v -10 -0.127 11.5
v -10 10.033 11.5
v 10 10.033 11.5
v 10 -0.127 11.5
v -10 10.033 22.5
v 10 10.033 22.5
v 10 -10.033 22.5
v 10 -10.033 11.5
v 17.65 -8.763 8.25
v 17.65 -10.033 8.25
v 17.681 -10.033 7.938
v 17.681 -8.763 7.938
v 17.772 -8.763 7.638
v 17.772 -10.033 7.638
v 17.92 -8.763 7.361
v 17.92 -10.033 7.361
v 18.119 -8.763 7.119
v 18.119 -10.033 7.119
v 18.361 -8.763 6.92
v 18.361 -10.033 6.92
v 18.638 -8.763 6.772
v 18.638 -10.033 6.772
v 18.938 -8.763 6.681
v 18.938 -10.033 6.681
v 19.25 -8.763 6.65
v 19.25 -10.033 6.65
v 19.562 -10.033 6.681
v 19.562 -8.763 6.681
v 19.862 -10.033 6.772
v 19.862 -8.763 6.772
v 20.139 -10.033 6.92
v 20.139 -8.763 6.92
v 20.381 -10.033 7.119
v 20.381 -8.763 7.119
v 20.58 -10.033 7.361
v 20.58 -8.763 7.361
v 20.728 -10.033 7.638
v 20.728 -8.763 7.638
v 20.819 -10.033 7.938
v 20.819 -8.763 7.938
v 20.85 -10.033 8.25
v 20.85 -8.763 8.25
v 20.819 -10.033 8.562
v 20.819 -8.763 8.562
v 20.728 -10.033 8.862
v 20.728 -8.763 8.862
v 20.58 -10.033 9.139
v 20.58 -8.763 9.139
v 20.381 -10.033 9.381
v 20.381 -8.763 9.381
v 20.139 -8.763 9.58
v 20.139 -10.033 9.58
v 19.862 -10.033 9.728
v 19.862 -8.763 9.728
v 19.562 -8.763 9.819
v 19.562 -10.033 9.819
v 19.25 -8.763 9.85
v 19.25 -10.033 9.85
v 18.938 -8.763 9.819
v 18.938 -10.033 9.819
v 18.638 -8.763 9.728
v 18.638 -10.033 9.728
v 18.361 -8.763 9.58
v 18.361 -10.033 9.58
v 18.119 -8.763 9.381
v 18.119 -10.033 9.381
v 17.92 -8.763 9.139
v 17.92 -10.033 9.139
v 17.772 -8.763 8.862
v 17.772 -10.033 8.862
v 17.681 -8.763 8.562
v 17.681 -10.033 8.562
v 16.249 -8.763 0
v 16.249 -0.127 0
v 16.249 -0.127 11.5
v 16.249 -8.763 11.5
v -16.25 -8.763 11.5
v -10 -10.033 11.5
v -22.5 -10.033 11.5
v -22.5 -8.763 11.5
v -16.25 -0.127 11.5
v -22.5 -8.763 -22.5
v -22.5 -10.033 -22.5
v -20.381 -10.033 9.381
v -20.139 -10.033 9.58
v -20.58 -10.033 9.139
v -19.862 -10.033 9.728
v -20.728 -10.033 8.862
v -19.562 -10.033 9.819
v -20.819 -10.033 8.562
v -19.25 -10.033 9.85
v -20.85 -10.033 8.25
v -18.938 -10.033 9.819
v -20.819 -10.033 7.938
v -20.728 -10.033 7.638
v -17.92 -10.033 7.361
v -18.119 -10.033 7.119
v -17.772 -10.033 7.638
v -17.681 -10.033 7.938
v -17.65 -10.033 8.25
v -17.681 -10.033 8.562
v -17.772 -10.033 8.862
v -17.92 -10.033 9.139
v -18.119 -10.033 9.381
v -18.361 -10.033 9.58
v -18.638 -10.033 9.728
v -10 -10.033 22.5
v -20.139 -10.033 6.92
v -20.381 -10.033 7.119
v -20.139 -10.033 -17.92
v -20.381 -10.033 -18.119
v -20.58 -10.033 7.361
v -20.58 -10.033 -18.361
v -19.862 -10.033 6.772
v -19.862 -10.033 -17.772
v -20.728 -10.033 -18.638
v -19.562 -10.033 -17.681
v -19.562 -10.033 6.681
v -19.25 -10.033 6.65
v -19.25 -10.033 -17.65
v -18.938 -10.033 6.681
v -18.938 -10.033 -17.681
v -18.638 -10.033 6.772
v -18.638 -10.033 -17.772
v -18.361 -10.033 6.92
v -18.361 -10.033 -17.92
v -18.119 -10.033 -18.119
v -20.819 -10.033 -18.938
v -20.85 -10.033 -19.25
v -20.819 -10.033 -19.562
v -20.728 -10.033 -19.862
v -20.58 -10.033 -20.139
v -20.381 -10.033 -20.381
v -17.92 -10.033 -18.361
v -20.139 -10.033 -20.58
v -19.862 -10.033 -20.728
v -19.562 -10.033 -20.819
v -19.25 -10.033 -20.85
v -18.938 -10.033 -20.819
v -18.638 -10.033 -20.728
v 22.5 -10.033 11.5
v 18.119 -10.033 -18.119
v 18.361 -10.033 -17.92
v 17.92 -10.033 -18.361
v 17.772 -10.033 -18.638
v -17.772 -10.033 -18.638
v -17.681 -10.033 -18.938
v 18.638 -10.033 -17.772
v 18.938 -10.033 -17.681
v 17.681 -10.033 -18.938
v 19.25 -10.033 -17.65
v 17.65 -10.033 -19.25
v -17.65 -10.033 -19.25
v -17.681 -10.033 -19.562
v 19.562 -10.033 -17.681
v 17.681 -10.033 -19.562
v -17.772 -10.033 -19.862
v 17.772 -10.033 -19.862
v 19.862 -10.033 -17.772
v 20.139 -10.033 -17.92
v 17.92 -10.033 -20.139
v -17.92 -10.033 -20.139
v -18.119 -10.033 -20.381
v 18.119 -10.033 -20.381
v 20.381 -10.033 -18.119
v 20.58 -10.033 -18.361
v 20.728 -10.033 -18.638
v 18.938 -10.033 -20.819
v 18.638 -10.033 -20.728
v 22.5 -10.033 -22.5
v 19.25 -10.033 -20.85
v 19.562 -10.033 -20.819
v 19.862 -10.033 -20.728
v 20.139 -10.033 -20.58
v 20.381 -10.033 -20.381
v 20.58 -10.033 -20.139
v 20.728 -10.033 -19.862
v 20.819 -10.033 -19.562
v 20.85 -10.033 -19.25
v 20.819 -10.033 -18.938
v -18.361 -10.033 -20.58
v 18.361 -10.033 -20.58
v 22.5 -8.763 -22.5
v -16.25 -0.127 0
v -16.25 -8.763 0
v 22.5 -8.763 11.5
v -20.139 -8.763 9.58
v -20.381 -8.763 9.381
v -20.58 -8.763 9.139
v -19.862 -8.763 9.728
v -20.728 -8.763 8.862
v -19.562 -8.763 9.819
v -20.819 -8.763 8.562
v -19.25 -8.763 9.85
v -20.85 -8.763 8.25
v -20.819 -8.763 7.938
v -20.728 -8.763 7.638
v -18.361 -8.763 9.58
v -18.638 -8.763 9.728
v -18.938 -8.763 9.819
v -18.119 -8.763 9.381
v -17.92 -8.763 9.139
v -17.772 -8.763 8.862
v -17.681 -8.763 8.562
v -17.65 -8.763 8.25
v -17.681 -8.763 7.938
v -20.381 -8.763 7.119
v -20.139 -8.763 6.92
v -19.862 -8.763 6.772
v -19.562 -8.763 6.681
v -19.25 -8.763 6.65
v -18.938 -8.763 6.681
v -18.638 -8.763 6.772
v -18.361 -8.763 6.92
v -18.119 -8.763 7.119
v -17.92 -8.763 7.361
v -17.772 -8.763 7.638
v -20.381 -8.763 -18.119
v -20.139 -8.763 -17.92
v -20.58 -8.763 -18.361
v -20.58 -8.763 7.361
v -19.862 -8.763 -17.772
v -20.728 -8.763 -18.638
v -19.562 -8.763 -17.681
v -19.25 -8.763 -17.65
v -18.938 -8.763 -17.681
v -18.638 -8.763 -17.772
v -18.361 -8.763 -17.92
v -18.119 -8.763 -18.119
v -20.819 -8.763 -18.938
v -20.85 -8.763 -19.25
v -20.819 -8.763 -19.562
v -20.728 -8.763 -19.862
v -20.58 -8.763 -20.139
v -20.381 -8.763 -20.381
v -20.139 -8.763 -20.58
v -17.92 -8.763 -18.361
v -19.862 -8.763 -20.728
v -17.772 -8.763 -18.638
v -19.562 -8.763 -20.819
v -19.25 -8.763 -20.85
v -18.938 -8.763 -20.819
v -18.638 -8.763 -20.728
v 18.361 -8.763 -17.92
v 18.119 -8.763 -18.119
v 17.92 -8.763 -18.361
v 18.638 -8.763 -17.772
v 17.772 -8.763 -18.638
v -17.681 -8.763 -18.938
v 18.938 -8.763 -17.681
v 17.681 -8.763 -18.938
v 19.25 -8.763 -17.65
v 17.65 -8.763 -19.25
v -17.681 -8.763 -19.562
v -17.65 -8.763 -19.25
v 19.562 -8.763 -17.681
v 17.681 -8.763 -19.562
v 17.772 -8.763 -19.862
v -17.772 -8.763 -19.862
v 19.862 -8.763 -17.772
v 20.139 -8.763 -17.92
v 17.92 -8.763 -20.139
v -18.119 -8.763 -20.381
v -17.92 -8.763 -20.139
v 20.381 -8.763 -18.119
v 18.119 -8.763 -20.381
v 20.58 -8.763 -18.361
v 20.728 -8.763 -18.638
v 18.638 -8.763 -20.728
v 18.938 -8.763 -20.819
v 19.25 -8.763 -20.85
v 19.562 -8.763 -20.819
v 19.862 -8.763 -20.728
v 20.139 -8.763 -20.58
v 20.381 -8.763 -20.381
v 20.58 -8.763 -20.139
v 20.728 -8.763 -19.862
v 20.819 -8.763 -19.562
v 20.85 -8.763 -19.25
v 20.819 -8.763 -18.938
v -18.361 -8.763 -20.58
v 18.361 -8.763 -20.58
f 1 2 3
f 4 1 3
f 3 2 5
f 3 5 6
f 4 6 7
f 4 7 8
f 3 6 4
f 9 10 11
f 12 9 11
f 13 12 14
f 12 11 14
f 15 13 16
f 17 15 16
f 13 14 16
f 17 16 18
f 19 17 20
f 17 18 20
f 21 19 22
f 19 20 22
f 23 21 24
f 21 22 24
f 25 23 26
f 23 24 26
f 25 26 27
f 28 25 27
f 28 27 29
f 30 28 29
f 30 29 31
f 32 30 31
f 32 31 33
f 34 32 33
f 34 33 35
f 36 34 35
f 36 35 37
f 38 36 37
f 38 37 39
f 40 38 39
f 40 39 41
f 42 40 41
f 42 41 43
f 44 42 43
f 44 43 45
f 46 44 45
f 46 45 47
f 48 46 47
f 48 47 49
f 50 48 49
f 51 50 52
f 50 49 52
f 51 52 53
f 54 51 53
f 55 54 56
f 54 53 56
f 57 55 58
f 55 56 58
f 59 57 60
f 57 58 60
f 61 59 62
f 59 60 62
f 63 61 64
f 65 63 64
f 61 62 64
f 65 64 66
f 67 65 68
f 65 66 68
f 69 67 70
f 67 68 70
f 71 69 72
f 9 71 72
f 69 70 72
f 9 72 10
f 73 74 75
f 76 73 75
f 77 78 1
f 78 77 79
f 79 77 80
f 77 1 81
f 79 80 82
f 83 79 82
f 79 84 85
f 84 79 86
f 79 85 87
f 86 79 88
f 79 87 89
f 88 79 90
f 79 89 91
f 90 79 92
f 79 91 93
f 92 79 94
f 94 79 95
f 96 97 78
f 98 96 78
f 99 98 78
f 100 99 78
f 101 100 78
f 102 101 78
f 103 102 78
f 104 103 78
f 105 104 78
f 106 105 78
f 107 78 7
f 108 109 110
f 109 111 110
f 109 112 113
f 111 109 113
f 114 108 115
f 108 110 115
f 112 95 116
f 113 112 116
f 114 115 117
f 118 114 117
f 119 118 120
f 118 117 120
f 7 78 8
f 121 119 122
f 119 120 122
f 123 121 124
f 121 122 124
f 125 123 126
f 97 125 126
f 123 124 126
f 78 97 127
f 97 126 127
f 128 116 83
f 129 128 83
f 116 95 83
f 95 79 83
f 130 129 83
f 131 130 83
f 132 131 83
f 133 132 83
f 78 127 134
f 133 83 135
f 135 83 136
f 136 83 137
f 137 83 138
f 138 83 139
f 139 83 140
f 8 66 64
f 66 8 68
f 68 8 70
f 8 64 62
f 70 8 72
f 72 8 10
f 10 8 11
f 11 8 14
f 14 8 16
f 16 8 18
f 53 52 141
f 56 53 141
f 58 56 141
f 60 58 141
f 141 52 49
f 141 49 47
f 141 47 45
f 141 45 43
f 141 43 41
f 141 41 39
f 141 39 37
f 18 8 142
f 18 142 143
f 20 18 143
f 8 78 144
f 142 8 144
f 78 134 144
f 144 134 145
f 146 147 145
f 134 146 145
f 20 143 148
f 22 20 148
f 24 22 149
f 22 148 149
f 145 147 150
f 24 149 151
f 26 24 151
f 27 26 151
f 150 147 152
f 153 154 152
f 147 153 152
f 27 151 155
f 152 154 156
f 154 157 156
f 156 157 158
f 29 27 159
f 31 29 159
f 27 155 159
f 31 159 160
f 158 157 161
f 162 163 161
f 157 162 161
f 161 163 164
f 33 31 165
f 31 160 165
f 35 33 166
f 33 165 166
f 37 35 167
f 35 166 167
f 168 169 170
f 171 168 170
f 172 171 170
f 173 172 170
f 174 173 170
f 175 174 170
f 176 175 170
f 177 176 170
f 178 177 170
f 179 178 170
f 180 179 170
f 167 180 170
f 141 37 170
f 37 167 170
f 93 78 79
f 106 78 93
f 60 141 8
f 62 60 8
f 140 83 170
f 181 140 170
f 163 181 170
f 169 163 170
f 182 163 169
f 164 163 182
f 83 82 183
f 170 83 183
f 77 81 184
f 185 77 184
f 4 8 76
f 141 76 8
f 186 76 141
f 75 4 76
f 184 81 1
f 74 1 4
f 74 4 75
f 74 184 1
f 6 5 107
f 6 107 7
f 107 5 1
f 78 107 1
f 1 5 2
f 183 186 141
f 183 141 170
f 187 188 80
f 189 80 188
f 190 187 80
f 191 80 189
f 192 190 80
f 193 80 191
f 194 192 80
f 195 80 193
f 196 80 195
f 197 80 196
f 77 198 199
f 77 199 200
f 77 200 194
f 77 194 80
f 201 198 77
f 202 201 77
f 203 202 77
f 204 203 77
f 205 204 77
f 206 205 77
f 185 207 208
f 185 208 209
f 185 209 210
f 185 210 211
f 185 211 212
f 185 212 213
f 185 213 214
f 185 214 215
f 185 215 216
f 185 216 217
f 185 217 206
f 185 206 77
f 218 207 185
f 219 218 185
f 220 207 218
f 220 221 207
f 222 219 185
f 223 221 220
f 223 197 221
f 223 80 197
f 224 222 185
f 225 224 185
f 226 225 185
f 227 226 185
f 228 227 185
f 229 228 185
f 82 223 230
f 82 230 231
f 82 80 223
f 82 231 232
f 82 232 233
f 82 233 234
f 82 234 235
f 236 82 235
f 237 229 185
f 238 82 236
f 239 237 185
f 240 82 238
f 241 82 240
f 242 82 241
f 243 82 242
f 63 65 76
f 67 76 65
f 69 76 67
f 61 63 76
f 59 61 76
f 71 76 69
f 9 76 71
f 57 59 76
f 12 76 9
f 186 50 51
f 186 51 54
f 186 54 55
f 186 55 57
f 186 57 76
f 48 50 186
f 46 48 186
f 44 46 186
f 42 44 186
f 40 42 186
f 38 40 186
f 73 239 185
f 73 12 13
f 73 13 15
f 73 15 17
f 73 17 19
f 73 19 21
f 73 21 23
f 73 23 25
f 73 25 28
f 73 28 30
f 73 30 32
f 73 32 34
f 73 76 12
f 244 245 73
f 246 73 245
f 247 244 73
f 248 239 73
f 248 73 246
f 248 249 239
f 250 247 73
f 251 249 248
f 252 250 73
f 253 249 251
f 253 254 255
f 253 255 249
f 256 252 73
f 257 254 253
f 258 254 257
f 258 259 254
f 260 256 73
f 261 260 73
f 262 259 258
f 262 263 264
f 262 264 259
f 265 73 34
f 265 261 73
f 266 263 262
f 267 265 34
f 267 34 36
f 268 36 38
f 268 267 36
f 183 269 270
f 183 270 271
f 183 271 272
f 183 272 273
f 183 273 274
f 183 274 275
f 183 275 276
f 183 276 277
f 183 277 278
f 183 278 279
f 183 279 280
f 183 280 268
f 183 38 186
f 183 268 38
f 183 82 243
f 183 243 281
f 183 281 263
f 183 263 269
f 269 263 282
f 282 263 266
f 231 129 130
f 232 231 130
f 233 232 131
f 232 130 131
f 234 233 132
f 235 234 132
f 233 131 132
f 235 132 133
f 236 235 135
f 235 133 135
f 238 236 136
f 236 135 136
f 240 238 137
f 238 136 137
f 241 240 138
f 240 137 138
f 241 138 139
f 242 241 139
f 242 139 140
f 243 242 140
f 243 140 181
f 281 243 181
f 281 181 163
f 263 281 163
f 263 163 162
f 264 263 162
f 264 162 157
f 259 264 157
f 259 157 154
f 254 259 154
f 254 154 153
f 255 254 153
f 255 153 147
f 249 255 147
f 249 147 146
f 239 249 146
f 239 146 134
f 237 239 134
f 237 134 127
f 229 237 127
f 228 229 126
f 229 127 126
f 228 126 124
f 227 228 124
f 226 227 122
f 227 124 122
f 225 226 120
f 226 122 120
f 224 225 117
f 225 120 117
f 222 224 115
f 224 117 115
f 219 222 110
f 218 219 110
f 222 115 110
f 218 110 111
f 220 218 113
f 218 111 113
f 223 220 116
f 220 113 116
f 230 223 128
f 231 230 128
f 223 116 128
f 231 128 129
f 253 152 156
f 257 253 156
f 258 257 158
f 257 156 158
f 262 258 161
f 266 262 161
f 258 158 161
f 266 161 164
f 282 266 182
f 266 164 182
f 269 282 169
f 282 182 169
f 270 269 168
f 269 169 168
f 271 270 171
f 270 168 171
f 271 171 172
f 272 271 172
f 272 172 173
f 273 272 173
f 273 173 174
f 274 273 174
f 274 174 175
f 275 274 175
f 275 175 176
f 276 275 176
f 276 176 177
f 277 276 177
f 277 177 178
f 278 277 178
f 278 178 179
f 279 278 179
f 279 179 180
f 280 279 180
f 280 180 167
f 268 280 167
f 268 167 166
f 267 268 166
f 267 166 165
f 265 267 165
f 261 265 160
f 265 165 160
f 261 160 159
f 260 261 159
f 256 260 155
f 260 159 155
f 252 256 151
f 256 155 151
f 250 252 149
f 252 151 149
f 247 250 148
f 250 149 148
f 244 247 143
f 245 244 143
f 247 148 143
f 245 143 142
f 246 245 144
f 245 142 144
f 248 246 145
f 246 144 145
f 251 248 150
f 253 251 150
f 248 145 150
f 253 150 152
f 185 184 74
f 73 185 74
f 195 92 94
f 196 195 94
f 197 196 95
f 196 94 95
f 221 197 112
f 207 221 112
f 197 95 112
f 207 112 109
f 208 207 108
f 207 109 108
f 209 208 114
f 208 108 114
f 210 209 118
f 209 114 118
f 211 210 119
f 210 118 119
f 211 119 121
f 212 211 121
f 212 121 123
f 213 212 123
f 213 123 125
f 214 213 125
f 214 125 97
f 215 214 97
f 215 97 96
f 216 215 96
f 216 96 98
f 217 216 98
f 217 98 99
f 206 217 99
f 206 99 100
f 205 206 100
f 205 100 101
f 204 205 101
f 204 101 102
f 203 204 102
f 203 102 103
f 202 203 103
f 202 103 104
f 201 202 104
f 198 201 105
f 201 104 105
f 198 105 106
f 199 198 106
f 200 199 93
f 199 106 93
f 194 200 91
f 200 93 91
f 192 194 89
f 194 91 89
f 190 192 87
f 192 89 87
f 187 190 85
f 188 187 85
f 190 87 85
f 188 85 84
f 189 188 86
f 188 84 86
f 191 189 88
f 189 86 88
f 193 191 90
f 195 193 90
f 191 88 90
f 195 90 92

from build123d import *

# Parameters (mm, degrees)
SKETCH1_W            = 45
SKETCH1_H            = 45
BOSS_EXTRUDE1_DEPTH  = 10.033
SKETCH2_W            = 12.5
SKETCH2_H            = 11
CUT_EXTRUDE1_DEPTH   = 20.066
CUT_EXTRUDE2_DEPTH   = 18.796
CUT_EXTRUDE3_DEPTH   = 10.16
M3_CLEARANCE_HOLE1_D = 3.2


with BuildPart() as part:
    # Sketch1 → Boss-Extrude1 (new, symmetric)
    with BuildSketch(Plane(origin=(0, 0, 0), x_dir=(1, 0, 0), z_dir=(0, 1, 0))):
        Rectangle(SKETCH1_W, SKETCH1_H)
    extrude(amount=BOSS_EXTRUDE1_DEPTH, both=True)

    # Sketch2 → Cut-Extrude1 (cut)
    with BuildSketch(Plane(origin=(0, 10.033, 0), x_dir=(1, 0, 0), z_dir=(0, 1, 0))):
        with Locations((16.25, -17)):
            Rectangle(SKETCH2_W, SKETCH2_H)
    cut_extrude1 = extrude(amount=-CUT_EXTRUDE1_DEPTH, mode=Mode.SUBTRACT)

    # Mirror1: Cut-Extrude1 across plane
    add(cut_extrude1.mirror(Plane(origin=(0, 0, 0), x_dir=(0, 0, 1), z_dir=(1, 0, 0))), mode=Mode.SUBTRACT)

    # Sketch3 → Cut-Extrude2 (cut)
    with BuildSketch(Plane(origin=(0, 10.033, 0), x_dir=(1, 0, 0), z_dir=(0, 1, 0))):
        Polygon((-22.5, -11.5), (-16.25, -11.5), (-16.25, 0), (16.248560403, 0), (16.248560403, -11.5), (22.5, -11.5), (22.5, 22.5), (-22.5, 22.5), align=None)
    extrude(amount=-CUT_EXTRUDE2_DEPTH, mode=Mode.SUBTRACT)

    # Sketch3<3> → Cut-Extrude3 (cut)
    with BuildSketch(Plane(origin=(0, 10.033, 0), x_dir=(1, 0, 0), z_dir=(0, 1, 0))):
        Polygon((-16.25, 0), (-16.25, -11.5), (-10, -11.5), (10, -11.5), (16.248560403, -11.5), (16.248560403, 0), align=None)
    extrude(amount=-CUT_EXTRUDE3_DEPTH, mode=Mode.SUBTRACT)

    # M3 Clearance Hole1 (through all)
    with Locations(Plane(origin=(0, -8.763, 0), x_dir=(1, 0, 0), z_dir=(0, 1, 0))):
        with Locations((-19.25, 19.25), (-19.25, -8.25), (19.25, -8.25), (19.25, 19.25)):
            Hole(M3_CLEARANCE_HOLE1_D / 2)


solid = part.part
